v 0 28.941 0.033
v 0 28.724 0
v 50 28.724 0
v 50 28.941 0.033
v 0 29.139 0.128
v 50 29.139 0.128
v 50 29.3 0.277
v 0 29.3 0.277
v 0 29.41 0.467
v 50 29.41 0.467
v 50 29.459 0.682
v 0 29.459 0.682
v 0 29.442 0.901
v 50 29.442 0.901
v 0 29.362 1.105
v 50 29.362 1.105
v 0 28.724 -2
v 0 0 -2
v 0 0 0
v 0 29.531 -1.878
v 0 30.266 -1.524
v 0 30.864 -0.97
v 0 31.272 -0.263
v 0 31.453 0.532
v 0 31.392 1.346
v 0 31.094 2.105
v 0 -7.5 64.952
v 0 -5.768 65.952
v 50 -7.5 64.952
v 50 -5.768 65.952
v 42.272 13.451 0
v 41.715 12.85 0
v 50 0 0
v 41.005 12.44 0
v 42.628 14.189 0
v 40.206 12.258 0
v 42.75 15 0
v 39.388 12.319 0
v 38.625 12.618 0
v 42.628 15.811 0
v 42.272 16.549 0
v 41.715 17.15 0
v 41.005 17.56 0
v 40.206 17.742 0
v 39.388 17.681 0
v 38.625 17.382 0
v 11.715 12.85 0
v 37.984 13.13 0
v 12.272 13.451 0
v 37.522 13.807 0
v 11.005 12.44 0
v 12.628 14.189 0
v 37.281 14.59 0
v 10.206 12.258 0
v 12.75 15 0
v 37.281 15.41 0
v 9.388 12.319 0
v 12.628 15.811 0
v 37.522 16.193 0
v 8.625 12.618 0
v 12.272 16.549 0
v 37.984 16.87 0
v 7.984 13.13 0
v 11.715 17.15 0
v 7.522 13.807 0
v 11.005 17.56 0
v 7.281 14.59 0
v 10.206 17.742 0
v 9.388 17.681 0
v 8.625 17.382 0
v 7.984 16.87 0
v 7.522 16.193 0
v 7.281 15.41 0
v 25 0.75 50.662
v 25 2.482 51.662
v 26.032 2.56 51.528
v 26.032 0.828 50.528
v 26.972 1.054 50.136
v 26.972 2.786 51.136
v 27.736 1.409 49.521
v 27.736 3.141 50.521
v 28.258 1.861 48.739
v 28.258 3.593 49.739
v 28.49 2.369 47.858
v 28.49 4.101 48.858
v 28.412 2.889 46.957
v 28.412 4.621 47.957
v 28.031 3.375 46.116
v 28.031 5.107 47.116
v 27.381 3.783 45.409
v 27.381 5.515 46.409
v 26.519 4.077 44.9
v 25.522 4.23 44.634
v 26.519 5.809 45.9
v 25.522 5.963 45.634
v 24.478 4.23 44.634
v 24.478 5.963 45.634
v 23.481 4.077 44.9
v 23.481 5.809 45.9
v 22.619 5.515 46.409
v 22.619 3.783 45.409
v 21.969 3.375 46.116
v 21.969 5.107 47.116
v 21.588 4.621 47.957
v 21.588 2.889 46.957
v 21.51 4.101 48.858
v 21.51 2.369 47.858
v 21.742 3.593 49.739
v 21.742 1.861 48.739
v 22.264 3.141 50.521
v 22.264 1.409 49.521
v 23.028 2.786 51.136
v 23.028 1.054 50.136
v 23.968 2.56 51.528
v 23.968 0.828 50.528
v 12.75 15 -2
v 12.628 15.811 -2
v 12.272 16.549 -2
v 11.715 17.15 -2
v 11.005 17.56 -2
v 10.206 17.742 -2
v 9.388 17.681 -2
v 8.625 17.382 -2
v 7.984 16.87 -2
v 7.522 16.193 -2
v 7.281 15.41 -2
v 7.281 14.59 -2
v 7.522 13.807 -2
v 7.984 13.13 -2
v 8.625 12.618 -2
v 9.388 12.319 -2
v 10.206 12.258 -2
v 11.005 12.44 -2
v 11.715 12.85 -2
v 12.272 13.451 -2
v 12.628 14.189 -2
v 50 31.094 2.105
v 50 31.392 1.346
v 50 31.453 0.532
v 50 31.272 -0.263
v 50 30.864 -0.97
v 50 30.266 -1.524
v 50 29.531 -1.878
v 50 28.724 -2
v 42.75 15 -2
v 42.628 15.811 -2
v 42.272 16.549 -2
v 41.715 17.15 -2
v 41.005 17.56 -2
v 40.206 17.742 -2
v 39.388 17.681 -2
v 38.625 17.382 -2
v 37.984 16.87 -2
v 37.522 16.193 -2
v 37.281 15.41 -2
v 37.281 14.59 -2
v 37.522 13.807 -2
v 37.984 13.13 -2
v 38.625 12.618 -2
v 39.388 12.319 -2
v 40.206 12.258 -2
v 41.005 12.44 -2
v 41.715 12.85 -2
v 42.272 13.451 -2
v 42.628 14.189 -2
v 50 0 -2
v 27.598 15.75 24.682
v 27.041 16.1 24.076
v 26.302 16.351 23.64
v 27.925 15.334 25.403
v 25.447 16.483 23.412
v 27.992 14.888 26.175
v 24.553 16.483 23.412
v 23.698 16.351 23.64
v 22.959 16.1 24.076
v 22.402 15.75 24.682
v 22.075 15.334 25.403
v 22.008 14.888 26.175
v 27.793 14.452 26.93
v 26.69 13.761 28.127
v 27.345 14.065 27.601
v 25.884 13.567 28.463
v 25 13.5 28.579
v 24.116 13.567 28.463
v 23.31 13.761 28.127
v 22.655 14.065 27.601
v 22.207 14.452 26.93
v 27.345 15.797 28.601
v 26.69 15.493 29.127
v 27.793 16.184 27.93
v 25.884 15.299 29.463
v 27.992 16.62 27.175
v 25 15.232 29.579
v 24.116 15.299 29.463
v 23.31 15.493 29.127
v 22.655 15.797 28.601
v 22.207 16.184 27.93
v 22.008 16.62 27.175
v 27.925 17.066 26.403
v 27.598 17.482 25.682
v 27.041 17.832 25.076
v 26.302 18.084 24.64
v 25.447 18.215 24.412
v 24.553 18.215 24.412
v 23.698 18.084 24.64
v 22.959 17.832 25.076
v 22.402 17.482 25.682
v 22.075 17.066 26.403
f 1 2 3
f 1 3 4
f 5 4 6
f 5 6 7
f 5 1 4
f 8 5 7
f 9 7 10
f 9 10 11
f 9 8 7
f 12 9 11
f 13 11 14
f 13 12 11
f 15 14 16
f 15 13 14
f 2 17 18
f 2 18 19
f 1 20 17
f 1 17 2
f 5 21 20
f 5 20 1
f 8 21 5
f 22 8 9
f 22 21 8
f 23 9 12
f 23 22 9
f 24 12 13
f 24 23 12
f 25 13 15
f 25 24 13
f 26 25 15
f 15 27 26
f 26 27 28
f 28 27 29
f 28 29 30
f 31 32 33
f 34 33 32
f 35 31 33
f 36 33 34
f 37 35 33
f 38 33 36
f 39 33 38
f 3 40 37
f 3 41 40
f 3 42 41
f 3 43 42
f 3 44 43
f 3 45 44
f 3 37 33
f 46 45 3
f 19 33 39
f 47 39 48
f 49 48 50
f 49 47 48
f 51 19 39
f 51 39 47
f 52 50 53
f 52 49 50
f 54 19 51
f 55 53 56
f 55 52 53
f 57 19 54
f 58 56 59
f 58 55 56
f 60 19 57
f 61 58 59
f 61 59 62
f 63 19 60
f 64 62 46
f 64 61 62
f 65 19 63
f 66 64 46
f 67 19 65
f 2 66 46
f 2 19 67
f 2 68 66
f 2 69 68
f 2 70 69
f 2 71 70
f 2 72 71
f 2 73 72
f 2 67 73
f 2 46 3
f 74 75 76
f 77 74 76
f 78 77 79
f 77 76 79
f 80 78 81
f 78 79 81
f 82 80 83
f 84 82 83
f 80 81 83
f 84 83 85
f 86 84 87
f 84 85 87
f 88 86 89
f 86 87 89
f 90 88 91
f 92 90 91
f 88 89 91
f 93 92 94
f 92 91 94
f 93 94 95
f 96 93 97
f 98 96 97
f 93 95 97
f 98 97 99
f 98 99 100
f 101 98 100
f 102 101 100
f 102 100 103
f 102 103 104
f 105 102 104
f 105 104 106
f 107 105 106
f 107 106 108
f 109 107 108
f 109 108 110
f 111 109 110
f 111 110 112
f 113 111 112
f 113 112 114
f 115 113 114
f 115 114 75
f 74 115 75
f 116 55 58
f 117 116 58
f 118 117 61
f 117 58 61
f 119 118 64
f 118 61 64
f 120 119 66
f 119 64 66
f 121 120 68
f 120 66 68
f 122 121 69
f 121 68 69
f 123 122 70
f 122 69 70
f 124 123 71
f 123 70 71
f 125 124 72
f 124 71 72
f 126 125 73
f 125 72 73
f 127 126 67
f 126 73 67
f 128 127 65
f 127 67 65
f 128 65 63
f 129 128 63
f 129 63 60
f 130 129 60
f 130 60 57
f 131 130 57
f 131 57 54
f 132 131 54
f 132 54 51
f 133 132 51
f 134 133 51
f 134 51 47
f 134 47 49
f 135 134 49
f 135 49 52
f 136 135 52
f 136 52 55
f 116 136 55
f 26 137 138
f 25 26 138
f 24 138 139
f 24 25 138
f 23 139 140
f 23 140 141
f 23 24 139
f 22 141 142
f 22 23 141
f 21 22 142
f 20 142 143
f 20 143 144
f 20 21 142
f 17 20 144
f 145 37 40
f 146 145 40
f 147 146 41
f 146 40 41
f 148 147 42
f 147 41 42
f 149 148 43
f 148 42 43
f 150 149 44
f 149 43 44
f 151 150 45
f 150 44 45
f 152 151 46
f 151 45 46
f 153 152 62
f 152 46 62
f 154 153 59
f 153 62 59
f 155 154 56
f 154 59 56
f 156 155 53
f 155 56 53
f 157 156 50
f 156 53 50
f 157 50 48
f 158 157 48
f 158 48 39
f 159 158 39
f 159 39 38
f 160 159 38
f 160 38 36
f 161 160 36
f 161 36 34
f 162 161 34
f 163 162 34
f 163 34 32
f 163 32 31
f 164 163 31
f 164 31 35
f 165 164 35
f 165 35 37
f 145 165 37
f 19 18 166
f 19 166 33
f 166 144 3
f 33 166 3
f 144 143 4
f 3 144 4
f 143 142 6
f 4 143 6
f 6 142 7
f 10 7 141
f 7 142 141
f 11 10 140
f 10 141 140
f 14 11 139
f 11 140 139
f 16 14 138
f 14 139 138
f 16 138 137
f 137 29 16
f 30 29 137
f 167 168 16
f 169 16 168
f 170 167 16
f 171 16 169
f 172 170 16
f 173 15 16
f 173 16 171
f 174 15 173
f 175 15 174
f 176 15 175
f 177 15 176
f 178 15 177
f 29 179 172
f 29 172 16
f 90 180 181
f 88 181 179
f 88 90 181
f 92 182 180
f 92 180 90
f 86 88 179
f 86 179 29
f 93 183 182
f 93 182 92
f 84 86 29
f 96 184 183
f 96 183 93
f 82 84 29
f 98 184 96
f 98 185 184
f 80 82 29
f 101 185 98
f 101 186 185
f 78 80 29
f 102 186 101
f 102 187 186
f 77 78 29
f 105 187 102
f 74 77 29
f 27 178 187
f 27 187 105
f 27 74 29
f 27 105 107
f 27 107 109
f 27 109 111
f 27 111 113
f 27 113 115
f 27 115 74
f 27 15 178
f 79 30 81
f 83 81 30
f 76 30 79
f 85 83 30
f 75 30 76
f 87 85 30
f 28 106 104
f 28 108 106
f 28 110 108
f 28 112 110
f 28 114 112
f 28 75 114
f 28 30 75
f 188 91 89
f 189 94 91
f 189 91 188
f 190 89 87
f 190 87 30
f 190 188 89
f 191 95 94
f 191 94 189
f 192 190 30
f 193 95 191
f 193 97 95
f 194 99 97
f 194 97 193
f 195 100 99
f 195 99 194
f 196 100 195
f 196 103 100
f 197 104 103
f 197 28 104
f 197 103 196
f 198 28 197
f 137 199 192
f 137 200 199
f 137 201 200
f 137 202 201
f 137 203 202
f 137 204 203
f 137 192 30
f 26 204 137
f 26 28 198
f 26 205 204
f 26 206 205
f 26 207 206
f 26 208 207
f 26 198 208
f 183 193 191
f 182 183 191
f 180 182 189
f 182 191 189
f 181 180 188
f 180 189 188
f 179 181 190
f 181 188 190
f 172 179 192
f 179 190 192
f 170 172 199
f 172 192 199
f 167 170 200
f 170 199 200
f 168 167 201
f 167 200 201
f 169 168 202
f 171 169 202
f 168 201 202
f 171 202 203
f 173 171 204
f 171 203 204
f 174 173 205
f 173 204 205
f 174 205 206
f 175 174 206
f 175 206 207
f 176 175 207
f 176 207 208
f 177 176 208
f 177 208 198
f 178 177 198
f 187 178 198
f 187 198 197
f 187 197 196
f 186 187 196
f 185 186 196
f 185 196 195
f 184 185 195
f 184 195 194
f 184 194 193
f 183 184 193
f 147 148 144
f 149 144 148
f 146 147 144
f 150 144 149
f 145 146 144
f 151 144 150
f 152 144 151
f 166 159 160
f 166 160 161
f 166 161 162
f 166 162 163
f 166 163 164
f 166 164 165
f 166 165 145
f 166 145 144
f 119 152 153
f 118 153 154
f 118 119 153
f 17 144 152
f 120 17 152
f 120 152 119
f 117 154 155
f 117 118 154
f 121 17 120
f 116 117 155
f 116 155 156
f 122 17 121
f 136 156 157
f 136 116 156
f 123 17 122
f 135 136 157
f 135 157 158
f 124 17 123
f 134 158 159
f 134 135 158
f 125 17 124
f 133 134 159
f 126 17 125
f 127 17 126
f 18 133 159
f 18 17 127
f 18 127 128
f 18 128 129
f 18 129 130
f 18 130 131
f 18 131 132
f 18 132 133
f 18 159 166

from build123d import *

# Parameters (mm, degrees)
FLANGE_BASE1_DEPTH          = 50
CORTE_EXTRUS_O2_REACH       = 80.784
ESBO_O2_R                   = 3
ESBO_O2_R_2                 = 3.5
FURO_COM_FOLGA_DE_M51_D     = 5.5
FURO_COM_FOLGA_DE_M51_DEPTH = 2


# Sheet-metal steps are written as plain solids
with BuildPart() as part:
    # Esboço1 → Flange-base1 (new body)
    with BuildSketch(Plane(origin=(0, 0, 0), x_dir=(0, 0, -1), z_dir=(1, 0, 0))):
        with BuildLine():
            Line((0, 0), (0, 28.724171375))
            ThreePointArc((0, 28.724171375), (-0.3683, 29.362085688), (-1.1049, 29.362085688))
            Line((-1.1049, 29.362085688), (-64.951905284, -7.5))
            Line((-64.951905284, -7.5), (-65.951905284, -5.767949192))
            Line((-65.951905284, -5.767949192), (-2.1049, 31.094136495))
            ThreePointArc((-2.1049, 31.094136495), (0.6317, 31.094136495), (2, 28.724171375))
            Line((2, 28.724171375), (2, 0))
            Line((2, 0), (0, 0))
        make_face()
    extrude(amount=FLANGE_BASE1_DEPTH)

    # Esboço2 → Corte-extrusão2 (cut, up to next)
    with BuildSketch(Plane(origin=(0, 24.232050808, 13.990381057), x_dir=(1, 0, 0), z_dir=(0, 0.866025403784436, 0.5000000000000044)), mode=Mode.PRIVATE) as corte_extrus_o2_sk1:
        with Locations(Location((25, -15, 0), (0, 0, 270))):
            Circle(ESBO_O2_R)
    corte_extrus_o2_tool1 = extrude(corte_extrus_o2_sk1.sketch, amount=-CORTE_EXTRUS_O2_REACH, mode=Mode.PRIVATE) & part.part
    # Esboço2 → Corte-extrusão2 (cut, up to next)
    with BuildSketch(Plane(origin=(0, 24.232050808, 13.990381057), x_dir=(1, 0, 0), z_dir=(0, 0.866025403784436, 0.5000000000000044)), mode=Mode.PRIVATE) as corte_extrus_o2_sk2:
        with Locations(Location((25, -40, 0), (0, 0, 270))):
            Circle(ESBO_O2_R_2)
    corte_extrus_o2_tool2 = extrude(corte_extrus_o2_sk2.sketch, amount=-CORTE_EXTRUS_O2_REACH, mode=Mode.PRIVATE) & part.part
    add(corte_extrus_o2_tool1.solids().sort_by_distance((25, 16.732051, 26.980762))[0], mode=Mode.SUBTRACT)
    add(corte_extrus_o2_tool2.solids().sort_by_distance((25, 4.232051, 48.631397))[0], mode=Mode.SUBTRACT)

    # Furo com folga de M51
    with Locations(Plane(origin=(0, 0, -2), x_dir=(-1, 0, 0), z_dir=(0, 0, -1))):
        with Locations((-10, 15), (-40, 15)):
            Hole(FURO_COM_FOLGA_DE_M51_D / 2, depth=FURO_COM_FOLGA_DE_M51_DEPTH)


solid = part.part
